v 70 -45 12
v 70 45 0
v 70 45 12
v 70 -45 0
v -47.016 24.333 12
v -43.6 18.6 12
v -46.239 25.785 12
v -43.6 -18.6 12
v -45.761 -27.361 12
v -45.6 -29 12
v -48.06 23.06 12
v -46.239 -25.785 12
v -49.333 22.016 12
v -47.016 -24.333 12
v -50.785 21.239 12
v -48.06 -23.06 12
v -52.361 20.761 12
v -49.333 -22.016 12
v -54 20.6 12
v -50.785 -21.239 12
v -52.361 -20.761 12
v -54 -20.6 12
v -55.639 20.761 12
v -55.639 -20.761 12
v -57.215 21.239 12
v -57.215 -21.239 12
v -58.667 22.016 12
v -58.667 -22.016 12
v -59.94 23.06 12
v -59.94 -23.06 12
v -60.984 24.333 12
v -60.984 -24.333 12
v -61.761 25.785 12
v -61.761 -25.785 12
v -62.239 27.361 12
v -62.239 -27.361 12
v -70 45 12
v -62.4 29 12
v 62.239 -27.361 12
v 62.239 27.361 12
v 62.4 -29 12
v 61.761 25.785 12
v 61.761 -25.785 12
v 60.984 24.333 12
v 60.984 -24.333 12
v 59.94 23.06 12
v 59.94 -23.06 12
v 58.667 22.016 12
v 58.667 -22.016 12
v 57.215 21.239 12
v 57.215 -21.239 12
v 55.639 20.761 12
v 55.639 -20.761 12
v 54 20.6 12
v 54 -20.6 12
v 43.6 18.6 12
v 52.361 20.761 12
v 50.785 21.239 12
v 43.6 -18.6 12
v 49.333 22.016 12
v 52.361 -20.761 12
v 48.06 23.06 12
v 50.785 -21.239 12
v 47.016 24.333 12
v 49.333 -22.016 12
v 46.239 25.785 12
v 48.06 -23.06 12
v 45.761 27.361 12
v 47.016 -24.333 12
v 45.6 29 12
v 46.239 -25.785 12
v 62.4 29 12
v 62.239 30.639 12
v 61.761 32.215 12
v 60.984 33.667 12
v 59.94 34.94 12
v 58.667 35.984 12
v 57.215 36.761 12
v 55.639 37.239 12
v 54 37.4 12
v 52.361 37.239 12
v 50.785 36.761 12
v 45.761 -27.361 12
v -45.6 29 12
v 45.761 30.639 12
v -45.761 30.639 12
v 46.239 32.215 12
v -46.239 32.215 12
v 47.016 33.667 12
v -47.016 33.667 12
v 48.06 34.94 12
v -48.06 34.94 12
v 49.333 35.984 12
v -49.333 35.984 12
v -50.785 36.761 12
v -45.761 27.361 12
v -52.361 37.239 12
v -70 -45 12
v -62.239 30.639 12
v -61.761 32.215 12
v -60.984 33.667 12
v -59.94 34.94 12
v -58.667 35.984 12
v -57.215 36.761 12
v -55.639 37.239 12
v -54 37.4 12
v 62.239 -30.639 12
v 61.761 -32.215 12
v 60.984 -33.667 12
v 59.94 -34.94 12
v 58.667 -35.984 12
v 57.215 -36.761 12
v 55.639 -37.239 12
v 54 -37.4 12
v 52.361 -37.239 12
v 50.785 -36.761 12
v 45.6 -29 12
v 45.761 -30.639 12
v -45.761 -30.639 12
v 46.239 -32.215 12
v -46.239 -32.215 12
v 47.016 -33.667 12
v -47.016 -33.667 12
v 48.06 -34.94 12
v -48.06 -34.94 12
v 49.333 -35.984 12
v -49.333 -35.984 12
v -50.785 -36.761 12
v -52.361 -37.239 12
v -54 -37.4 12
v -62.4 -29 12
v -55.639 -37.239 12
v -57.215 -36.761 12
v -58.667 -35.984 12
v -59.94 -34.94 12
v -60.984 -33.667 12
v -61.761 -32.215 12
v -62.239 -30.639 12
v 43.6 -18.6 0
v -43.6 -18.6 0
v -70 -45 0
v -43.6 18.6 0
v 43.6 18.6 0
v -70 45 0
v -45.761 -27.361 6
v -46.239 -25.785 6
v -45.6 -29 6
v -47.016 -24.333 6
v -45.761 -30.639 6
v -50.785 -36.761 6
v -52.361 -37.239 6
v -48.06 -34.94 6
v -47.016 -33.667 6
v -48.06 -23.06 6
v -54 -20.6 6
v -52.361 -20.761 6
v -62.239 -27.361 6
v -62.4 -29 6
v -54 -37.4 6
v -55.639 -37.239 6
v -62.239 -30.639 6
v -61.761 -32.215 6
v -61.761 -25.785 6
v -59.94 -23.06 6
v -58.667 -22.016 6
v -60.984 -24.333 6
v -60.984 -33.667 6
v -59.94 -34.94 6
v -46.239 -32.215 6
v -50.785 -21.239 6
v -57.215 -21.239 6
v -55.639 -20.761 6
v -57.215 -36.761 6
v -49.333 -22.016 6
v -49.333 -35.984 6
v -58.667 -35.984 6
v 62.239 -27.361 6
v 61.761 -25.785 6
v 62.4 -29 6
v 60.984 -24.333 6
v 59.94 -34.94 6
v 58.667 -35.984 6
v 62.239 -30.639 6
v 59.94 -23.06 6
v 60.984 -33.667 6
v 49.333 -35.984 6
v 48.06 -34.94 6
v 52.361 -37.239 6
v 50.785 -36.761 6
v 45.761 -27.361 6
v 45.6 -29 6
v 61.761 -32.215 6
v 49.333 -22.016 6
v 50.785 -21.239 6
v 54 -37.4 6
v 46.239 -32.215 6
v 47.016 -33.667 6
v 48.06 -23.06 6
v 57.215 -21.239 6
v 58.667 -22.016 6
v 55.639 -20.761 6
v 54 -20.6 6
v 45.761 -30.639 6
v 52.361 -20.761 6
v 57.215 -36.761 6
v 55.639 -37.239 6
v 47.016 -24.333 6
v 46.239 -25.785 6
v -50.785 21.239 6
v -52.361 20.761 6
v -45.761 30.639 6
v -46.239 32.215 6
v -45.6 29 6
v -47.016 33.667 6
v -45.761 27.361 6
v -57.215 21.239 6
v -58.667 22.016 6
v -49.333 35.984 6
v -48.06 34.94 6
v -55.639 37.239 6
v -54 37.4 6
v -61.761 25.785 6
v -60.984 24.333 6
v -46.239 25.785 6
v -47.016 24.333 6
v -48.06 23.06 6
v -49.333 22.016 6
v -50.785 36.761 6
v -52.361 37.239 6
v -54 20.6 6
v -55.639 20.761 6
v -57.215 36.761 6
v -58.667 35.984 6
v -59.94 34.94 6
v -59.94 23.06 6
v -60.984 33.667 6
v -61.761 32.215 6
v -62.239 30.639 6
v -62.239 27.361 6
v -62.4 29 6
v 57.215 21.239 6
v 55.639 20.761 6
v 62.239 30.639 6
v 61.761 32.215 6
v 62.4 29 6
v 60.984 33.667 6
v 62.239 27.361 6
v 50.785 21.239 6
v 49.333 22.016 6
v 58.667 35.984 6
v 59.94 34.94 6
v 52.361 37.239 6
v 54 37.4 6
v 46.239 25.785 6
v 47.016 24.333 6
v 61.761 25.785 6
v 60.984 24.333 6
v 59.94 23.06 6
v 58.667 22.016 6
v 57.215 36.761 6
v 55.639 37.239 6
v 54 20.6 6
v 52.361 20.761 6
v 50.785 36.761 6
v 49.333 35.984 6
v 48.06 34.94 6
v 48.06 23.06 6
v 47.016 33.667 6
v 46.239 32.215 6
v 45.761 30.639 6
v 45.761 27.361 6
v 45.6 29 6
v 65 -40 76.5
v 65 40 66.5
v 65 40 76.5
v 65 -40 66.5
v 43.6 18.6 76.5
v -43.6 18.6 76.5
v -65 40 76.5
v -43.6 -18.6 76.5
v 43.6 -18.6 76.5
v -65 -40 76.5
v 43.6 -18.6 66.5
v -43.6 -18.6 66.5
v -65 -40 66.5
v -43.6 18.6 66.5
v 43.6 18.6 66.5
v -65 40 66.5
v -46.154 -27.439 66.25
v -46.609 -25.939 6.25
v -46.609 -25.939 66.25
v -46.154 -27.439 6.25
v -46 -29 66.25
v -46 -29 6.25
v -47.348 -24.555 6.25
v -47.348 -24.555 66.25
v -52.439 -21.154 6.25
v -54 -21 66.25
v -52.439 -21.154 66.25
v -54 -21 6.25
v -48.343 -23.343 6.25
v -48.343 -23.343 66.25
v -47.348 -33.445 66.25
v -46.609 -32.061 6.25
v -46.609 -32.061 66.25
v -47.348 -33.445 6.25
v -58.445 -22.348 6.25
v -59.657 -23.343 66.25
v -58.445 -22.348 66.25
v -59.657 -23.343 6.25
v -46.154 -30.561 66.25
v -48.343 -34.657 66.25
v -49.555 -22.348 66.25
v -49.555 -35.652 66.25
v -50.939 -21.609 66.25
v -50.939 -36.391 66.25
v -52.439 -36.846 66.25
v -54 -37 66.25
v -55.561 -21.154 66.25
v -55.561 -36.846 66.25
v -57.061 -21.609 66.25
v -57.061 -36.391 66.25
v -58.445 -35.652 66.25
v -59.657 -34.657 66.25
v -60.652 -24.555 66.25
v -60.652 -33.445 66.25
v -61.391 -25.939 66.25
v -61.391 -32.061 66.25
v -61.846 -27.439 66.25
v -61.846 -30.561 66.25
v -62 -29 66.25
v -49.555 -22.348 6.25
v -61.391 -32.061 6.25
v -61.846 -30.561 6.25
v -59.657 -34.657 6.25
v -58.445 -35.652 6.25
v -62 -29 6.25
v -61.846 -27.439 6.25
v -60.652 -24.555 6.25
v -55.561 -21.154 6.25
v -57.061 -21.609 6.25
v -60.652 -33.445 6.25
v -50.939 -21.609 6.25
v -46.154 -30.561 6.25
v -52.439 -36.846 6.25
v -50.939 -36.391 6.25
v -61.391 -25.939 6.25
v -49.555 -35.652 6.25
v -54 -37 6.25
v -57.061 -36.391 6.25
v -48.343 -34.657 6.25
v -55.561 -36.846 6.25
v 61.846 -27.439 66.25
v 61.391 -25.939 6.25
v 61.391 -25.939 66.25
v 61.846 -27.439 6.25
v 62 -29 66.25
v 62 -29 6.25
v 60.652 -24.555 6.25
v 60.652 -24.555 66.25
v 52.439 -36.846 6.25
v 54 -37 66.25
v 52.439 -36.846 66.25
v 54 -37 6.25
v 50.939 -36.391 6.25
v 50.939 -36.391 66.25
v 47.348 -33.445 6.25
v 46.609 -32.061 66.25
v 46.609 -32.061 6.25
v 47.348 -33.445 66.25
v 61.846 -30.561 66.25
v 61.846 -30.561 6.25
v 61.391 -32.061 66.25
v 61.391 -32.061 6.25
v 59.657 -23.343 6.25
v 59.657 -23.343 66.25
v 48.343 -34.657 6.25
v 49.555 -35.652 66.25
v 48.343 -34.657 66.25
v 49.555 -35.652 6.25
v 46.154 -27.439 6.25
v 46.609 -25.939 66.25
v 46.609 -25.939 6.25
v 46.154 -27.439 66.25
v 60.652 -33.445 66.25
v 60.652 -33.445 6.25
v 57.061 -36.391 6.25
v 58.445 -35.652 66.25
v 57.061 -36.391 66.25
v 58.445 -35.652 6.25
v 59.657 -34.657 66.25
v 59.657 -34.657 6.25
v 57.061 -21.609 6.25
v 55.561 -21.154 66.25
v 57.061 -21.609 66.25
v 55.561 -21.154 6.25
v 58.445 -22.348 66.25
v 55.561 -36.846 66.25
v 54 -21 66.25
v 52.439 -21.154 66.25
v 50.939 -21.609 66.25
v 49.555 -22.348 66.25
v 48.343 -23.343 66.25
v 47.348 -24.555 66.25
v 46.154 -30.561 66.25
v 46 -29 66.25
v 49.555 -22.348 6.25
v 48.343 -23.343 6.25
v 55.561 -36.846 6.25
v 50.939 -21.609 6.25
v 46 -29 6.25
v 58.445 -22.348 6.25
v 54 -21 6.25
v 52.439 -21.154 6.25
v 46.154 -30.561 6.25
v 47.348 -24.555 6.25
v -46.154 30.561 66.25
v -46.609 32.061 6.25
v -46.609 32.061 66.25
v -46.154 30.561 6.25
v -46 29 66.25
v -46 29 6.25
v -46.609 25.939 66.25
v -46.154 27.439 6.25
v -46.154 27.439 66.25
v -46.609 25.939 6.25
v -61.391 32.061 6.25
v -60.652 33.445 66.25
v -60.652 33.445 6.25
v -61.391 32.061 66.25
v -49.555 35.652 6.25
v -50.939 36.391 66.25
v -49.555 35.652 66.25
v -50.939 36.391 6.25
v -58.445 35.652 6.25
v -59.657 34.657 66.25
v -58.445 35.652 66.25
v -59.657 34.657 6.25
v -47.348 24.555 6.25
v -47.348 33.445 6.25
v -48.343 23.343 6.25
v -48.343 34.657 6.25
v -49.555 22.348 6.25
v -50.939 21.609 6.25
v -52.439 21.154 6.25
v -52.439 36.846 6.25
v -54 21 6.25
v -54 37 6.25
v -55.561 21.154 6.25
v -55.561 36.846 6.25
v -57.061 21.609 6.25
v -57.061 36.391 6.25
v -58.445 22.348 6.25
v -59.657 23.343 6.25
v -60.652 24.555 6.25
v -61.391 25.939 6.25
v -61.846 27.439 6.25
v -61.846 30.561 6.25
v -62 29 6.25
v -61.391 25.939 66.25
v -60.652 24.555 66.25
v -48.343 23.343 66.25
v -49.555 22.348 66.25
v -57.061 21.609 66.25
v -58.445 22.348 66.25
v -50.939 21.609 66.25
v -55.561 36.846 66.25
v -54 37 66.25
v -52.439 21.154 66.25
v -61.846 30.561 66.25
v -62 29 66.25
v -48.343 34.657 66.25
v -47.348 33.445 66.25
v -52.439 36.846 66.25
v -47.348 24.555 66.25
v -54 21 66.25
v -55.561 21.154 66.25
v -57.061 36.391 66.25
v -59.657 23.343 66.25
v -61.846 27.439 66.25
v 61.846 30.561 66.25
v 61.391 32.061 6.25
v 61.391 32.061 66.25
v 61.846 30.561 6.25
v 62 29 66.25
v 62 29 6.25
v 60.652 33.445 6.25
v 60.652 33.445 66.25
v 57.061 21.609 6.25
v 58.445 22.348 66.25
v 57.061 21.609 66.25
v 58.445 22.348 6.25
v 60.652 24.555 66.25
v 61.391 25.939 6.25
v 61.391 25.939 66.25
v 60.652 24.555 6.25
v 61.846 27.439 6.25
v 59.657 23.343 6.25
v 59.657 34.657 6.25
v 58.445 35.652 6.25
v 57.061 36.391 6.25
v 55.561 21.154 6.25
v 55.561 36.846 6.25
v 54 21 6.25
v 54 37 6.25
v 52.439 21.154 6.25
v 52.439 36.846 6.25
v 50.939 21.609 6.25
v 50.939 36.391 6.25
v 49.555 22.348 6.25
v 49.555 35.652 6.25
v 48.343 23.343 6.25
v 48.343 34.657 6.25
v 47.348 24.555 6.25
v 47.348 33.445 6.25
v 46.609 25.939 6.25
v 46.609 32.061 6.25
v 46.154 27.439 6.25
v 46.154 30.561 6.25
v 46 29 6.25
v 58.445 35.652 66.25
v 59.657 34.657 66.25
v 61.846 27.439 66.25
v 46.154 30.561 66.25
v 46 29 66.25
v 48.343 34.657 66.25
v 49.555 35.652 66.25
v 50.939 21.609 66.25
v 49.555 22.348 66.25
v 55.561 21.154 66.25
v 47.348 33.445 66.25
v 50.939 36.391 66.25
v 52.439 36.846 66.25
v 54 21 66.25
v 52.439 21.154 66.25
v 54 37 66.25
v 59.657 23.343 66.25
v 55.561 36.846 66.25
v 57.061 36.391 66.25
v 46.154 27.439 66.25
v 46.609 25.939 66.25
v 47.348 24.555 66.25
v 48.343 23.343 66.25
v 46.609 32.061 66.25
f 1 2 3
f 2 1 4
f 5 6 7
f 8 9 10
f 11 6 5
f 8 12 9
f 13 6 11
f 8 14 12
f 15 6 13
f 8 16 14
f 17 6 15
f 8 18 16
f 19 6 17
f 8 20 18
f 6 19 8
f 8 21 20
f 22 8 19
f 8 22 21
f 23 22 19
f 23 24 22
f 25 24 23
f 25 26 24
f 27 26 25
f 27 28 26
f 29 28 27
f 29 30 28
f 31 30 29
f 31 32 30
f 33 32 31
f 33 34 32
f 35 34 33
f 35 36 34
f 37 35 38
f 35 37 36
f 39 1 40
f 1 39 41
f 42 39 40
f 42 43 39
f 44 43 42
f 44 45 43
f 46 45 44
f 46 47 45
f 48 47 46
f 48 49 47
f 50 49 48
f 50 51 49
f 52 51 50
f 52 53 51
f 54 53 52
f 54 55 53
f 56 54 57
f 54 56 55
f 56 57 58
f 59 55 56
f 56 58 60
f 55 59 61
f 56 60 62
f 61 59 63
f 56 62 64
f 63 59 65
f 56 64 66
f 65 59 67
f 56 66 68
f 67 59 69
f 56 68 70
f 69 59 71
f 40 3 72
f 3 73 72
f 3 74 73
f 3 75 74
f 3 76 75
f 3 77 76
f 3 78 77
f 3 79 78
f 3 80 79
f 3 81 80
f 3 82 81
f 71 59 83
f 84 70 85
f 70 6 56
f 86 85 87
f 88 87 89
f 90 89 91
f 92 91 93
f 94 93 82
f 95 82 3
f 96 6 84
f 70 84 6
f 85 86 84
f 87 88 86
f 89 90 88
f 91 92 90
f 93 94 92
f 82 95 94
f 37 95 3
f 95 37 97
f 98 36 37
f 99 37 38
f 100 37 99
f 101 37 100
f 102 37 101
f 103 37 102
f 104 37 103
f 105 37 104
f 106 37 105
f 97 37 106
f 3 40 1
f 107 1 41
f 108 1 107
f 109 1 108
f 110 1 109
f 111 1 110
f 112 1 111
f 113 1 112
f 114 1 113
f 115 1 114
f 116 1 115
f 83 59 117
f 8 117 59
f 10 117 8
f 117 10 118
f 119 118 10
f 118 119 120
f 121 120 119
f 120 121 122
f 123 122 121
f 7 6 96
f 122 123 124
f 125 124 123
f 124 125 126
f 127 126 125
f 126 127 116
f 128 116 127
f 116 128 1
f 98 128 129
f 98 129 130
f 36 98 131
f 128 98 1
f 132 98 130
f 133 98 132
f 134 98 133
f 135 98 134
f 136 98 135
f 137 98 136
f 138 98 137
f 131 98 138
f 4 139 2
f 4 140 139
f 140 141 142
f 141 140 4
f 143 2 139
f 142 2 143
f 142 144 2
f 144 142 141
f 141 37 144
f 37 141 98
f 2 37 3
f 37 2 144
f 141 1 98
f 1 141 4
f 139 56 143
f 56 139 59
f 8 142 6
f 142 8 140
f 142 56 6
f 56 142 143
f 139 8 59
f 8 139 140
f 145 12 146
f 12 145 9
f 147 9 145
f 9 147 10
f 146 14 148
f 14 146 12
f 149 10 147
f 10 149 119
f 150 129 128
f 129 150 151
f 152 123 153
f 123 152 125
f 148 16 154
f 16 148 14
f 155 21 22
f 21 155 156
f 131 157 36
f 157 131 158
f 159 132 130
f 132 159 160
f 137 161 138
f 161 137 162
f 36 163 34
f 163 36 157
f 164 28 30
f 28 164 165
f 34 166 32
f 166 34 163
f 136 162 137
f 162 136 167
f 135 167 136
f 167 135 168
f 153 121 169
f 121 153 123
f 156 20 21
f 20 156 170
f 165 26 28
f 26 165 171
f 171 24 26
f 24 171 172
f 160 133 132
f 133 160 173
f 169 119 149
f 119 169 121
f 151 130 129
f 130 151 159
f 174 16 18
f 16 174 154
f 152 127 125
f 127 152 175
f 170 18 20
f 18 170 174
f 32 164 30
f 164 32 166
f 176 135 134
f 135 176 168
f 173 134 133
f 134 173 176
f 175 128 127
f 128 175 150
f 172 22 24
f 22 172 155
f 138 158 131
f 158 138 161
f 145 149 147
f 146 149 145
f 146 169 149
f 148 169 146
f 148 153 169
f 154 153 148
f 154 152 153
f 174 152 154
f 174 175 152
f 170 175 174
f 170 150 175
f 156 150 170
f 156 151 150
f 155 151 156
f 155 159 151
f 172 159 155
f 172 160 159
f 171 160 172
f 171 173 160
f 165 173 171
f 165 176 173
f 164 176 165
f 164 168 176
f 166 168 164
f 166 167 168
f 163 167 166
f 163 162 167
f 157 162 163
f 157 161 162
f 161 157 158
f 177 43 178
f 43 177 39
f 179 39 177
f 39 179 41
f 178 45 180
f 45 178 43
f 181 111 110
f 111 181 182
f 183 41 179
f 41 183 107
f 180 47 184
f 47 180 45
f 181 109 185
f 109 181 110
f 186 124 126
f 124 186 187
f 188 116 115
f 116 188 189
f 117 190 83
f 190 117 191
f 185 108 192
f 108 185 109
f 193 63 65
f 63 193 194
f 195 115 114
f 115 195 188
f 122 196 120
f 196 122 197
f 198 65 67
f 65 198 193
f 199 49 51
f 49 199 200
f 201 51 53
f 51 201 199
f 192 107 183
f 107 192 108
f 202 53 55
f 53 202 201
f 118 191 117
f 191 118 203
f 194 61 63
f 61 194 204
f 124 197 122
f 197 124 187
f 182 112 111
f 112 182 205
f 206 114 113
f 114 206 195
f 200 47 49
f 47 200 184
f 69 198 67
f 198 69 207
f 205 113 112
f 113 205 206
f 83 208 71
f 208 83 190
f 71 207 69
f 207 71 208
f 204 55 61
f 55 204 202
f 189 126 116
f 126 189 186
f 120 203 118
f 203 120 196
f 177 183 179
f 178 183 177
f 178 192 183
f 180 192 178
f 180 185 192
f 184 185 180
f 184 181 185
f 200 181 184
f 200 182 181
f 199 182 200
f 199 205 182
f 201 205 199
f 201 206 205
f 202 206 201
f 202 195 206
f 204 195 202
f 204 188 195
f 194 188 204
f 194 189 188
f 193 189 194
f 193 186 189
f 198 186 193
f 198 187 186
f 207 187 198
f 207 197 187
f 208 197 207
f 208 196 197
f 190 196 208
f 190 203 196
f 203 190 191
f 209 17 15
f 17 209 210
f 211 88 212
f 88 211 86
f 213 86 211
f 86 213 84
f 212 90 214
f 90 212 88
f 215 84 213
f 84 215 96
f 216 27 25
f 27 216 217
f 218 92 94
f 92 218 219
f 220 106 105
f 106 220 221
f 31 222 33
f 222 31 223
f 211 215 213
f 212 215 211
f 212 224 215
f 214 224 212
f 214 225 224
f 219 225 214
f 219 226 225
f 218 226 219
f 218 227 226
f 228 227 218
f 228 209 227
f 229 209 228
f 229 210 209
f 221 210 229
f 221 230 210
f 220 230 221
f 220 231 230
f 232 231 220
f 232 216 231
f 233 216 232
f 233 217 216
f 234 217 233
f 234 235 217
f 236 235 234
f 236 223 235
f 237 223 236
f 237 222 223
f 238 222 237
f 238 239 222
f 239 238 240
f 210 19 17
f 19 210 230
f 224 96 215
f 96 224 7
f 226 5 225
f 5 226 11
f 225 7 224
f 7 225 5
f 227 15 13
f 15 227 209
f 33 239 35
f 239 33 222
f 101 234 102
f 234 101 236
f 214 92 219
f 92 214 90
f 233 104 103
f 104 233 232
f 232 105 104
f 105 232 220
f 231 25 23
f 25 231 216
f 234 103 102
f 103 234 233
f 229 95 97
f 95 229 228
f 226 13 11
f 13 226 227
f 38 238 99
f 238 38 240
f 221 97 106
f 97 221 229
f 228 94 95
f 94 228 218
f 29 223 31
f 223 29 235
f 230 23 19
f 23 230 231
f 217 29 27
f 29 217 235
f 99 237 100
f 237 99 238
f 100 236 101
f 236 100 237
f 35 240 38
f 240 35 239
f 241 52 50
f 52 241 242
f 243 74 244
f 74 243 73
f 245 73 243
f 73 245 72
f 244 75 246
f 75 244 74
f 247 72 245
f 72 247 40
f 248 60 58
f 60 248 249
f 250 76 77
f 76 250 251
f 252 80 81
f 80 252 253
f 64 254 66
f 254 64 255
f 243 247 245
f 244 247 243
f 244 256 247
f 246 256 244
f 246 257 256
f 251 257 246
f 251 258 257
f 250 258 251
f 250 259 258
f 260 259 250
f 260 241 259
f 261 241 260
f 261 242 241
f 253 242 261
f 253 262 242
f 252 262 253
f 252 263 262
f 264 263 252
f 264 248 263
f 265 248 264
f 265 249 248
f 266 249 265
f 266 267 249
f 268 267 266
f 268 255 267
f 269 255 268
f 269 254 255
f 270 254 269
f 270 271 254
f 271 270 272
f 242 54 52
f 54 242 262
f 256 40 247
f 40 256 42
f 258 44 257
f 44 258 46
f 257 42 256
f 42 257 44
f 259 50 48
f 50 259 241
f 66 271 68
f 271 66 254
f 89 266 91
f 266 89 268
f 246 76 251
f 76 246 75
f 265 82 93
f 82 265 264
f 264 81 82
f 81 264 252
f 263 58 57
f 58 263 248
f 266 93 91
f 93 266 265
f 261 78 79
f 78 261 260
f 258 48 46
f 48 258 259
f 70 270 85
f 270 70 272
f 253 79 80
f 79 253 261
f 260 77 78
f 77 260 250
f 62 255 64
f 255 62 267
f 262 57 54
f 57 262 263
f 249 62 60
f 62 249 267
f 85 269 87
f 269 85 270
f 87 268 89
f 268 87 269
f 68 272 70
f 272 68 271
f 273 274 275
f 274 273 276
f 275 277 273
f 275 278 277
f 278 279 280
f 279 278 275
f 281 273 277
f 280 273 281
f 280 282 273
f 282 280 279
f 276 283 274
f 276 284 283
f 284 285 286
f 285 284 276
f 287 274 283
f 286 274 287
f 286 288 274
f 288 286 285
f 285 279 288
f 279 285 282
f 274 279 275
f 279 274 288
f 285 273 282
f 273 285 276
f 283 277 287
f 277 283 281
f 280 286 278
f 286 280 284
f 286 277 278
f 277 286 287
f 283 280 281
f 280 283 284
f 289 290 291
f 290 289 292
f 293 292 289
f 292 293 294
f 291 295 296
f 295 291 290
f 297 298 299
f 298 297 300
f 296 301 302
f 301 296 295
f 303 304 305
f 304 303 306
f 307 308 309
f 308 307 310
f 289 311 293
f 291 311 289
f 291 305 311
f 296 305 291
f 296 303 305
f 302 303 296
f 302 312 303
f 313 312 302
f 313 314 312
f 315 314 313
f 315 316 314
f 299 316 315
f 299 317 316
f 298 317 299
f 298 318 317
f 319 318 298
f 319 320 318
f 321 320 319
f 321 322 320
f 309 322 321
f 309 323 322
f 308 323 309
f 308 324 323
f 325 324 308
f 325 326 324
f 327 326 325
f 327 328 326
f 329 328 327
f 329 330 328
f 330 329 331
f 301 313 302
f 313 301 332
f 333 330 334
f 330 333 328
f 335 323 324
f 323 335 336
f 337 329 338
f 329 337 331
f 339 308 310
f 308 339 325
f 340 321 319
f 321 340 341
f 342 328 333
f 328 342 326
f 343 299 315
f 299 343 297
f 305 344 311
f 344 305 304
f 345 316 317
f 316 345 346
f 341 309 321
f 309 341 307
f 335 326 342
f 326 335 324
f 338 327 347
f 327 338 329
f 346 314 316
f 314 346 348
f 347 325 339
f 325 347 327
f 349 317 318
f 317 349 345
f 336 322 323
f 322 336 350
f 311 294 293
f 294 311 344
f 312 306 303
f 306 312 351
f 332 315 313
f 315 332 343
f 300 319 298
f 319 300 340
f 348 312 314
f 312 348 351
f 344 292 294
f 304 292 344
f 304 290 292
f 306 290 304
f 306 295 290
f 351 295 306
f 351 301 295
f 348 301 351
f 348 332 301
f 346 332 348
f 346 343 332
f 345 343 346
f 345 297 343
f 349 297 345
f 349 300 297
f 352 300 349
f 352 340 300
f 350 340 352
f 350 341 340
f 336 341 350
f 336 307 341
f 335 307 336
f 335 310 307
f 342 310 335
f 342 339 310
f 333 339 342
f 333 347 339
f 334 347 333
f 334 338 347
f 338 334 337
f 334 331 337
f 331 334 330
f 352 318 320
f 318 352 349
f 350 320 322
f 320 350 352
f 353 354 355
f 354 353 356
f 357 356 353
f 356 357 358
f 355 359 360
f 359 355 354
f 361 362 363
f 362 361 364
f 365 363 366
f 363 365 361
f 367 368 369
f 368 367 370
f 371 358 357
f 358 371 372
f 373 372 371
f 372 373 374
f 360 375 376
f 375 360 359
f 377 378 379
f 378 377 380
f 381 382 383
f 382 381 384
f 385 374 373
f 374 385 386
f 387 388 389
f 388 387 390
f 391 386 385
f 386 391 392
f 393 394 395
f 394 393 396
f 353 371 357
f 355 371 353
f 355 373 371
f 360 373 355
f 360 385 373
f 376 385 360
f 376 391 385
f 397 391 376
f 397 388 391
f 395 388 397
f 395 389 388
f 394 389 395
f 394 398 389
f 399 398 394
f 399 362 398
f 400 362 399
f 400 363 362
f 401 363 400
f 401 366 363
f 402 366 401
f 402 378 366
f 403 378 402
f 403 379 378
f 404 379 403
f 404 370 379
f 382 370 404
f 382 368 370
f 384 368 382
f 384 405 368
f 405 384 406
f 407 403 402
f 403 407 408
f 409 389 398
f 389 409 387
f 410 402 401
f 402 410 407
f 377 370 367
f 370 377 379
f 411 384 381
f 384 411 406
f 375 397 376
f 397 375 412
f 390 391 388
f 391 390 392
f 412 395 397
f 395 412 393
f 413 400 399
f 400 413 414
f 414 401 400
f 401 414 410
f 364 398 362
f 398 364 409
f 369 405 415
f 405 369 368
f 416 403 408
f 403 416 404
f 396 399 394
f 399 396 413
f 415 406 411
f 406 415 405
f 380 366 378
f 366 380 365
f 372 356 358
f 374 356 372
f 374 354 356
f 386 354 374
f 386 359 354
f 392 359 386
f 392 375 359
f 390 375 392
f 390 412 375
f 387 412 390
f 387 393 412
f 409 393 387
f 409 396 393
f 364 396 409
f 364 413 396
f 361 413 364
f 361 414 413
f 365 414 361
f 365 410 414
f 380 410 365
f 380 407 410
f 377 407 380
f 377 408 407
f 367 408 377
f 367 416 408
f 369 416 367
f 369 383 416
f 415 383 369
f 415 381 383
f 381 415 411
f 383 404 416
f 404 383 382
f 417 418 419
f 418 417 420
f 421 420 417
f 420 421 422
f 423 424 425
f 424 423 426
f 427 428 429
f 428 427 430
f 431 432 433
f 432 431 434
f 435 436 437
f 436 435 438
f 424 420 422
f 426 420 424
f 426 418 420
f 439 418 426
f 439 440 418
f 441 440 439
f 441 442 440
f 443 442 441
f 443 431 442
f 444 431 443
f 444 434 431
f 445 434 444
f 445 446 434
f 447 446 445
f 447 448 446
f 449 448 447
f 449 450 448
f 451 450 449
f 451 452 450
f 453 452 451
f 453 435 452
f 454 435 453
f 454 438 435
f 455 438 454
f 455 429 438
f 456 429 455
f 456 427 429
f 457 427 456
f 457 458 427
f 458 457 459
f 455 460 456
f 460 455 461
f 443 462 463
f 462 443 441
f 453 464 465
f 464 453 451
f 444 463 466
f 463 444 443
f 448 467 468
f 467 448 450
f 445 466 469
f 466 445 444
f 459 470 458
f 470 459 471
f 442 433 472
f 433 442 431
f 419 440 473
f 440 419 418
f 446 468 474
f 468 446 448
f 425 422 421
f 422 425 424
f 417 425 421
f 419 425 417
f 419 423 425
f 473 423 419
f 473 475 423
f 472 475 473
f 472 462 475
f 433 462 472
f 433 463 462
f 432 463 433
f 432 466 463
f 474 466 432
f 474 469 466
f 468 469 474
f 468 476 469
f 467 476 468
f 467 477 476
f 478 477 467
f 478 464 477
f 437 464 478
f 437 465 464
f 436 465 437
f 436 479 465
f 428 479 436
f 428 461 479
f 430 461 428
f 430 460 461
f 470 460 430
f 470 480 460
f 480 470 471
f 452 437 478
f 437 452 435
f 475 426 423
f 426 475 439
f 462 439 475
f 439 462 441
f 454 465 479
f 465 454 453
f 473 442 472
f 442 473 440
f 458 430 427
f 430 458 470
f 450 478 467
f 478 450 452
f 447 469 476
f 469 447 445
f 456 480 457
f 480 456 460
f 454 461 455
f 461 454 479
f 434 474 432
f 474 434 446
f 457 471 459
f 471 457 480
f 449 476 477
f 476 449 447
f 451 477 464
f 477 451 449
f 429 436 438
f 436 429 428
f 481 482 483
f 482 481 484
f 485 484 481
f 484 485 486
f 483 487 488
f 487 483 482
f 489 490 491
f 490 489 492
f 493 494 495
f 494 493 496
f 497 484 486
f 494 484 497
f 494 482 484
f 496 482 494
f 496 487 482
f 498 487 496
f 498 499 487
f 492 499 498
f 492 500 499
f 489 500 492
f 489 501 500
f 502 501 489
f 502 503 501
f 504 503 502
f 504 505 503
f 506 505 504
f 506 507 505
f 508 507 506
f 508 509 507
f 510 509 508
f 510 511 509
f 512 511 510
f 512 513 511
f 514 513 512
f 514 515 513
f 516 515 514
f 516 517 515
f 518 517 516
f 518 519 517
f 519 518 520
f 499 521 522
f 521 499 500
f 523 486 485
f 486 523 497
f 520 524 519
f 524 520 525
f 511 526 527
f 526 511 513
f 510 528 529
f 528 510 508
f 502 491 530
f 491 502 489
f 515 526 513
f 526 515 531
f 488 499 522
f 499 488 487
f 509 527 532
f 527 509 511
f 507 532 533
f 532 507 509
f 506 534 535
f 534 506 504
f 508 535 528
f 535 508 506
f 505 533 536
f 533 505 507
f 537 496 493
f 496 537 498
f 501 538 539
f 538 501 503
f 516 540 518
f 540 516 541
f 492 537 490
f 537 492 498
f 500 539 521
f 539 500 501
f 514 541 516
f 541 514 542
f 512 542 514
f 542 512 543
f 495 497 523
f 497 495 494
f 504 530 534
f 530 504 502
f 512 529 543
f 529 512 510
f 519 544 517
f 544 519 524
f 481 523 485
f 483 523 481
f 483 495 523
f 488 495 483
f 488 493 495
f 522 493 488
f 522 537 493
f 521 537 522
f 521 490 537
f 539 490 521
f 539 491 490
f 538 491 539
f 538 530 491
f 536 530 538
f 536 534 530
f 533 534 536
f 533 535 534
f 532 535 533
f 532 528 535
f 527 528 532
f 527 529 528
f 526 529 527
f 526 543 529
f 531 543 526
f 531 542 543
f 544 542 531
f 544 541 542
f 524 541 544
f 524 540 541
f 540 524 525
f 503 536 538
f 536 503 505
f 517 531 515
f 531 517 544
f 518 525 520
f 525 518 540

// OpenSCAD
$fn = 32;

// ------------------------------------------------------------------------
// Frame cube: base 140 x 90 mm, posts 60 mm tall
// Every part is its own module, assembly() places every instance.
// ------------------------------------------------------------------------

// --- part 1 ---
module base_frame() {
  difference() {
    translate([-70, -45, 0]) cube([140, 90, 12]);
    translate([-43.6, -18.6, -1]) cube([87.2, 37.2, 14]);
    translate([-54, -29, 6]) cylinder(h = 7, d = 16.8);
    translate([54, -29, 6]) cylinder(h = 7, d = 16.8);
    translate([-54, 29, 6]) cylinder(h = 7, d = 16.8);
    translate([54, 29, 6]) cylinder(h = 7, d = 16.8);
  }
}

// --- part 2 ---
module corner_post() {
  cylinder(h = 60, d = 16);
}

// --- part 3 ---
module top_frame() {
  difference() {
    translate([-65, -40, 0]) cube([130, 80, 10]);
    translate([-43.6, -18.6, -1]) cube([87.2, 37.2, 12]);
  }
}

// --- assembly ---
module assembly() {
  color([0.80, 0.24, 0.20]) translate([0, 0, 0]) rotate([0, 0, 0]) base_frame();
  color([0.20, 0.45, 0.75]) translate([-54, -29, 6.25]) rotate([0, 0, 0]) corner_post();
  color([0.25, 0.62, 0.32]) translate([54, -29, 6.25]) rotate([0, 0, 0]) corner_post();
  color([0.92, 0.70, 0.18]) translate([-54, 29, 6.25]) rotate([0, 0, 0]) corner_post();
  color([0.58, 0.35, 0.70]) translate([54, 29, 6.25]) rotate([0, 0, 0]) corner_post();
  color([0.16, 0.66, 0.66]) translate([0, 0, 66.5]) rotate([0, 0, 0]) top_frame();
}

assembly();
